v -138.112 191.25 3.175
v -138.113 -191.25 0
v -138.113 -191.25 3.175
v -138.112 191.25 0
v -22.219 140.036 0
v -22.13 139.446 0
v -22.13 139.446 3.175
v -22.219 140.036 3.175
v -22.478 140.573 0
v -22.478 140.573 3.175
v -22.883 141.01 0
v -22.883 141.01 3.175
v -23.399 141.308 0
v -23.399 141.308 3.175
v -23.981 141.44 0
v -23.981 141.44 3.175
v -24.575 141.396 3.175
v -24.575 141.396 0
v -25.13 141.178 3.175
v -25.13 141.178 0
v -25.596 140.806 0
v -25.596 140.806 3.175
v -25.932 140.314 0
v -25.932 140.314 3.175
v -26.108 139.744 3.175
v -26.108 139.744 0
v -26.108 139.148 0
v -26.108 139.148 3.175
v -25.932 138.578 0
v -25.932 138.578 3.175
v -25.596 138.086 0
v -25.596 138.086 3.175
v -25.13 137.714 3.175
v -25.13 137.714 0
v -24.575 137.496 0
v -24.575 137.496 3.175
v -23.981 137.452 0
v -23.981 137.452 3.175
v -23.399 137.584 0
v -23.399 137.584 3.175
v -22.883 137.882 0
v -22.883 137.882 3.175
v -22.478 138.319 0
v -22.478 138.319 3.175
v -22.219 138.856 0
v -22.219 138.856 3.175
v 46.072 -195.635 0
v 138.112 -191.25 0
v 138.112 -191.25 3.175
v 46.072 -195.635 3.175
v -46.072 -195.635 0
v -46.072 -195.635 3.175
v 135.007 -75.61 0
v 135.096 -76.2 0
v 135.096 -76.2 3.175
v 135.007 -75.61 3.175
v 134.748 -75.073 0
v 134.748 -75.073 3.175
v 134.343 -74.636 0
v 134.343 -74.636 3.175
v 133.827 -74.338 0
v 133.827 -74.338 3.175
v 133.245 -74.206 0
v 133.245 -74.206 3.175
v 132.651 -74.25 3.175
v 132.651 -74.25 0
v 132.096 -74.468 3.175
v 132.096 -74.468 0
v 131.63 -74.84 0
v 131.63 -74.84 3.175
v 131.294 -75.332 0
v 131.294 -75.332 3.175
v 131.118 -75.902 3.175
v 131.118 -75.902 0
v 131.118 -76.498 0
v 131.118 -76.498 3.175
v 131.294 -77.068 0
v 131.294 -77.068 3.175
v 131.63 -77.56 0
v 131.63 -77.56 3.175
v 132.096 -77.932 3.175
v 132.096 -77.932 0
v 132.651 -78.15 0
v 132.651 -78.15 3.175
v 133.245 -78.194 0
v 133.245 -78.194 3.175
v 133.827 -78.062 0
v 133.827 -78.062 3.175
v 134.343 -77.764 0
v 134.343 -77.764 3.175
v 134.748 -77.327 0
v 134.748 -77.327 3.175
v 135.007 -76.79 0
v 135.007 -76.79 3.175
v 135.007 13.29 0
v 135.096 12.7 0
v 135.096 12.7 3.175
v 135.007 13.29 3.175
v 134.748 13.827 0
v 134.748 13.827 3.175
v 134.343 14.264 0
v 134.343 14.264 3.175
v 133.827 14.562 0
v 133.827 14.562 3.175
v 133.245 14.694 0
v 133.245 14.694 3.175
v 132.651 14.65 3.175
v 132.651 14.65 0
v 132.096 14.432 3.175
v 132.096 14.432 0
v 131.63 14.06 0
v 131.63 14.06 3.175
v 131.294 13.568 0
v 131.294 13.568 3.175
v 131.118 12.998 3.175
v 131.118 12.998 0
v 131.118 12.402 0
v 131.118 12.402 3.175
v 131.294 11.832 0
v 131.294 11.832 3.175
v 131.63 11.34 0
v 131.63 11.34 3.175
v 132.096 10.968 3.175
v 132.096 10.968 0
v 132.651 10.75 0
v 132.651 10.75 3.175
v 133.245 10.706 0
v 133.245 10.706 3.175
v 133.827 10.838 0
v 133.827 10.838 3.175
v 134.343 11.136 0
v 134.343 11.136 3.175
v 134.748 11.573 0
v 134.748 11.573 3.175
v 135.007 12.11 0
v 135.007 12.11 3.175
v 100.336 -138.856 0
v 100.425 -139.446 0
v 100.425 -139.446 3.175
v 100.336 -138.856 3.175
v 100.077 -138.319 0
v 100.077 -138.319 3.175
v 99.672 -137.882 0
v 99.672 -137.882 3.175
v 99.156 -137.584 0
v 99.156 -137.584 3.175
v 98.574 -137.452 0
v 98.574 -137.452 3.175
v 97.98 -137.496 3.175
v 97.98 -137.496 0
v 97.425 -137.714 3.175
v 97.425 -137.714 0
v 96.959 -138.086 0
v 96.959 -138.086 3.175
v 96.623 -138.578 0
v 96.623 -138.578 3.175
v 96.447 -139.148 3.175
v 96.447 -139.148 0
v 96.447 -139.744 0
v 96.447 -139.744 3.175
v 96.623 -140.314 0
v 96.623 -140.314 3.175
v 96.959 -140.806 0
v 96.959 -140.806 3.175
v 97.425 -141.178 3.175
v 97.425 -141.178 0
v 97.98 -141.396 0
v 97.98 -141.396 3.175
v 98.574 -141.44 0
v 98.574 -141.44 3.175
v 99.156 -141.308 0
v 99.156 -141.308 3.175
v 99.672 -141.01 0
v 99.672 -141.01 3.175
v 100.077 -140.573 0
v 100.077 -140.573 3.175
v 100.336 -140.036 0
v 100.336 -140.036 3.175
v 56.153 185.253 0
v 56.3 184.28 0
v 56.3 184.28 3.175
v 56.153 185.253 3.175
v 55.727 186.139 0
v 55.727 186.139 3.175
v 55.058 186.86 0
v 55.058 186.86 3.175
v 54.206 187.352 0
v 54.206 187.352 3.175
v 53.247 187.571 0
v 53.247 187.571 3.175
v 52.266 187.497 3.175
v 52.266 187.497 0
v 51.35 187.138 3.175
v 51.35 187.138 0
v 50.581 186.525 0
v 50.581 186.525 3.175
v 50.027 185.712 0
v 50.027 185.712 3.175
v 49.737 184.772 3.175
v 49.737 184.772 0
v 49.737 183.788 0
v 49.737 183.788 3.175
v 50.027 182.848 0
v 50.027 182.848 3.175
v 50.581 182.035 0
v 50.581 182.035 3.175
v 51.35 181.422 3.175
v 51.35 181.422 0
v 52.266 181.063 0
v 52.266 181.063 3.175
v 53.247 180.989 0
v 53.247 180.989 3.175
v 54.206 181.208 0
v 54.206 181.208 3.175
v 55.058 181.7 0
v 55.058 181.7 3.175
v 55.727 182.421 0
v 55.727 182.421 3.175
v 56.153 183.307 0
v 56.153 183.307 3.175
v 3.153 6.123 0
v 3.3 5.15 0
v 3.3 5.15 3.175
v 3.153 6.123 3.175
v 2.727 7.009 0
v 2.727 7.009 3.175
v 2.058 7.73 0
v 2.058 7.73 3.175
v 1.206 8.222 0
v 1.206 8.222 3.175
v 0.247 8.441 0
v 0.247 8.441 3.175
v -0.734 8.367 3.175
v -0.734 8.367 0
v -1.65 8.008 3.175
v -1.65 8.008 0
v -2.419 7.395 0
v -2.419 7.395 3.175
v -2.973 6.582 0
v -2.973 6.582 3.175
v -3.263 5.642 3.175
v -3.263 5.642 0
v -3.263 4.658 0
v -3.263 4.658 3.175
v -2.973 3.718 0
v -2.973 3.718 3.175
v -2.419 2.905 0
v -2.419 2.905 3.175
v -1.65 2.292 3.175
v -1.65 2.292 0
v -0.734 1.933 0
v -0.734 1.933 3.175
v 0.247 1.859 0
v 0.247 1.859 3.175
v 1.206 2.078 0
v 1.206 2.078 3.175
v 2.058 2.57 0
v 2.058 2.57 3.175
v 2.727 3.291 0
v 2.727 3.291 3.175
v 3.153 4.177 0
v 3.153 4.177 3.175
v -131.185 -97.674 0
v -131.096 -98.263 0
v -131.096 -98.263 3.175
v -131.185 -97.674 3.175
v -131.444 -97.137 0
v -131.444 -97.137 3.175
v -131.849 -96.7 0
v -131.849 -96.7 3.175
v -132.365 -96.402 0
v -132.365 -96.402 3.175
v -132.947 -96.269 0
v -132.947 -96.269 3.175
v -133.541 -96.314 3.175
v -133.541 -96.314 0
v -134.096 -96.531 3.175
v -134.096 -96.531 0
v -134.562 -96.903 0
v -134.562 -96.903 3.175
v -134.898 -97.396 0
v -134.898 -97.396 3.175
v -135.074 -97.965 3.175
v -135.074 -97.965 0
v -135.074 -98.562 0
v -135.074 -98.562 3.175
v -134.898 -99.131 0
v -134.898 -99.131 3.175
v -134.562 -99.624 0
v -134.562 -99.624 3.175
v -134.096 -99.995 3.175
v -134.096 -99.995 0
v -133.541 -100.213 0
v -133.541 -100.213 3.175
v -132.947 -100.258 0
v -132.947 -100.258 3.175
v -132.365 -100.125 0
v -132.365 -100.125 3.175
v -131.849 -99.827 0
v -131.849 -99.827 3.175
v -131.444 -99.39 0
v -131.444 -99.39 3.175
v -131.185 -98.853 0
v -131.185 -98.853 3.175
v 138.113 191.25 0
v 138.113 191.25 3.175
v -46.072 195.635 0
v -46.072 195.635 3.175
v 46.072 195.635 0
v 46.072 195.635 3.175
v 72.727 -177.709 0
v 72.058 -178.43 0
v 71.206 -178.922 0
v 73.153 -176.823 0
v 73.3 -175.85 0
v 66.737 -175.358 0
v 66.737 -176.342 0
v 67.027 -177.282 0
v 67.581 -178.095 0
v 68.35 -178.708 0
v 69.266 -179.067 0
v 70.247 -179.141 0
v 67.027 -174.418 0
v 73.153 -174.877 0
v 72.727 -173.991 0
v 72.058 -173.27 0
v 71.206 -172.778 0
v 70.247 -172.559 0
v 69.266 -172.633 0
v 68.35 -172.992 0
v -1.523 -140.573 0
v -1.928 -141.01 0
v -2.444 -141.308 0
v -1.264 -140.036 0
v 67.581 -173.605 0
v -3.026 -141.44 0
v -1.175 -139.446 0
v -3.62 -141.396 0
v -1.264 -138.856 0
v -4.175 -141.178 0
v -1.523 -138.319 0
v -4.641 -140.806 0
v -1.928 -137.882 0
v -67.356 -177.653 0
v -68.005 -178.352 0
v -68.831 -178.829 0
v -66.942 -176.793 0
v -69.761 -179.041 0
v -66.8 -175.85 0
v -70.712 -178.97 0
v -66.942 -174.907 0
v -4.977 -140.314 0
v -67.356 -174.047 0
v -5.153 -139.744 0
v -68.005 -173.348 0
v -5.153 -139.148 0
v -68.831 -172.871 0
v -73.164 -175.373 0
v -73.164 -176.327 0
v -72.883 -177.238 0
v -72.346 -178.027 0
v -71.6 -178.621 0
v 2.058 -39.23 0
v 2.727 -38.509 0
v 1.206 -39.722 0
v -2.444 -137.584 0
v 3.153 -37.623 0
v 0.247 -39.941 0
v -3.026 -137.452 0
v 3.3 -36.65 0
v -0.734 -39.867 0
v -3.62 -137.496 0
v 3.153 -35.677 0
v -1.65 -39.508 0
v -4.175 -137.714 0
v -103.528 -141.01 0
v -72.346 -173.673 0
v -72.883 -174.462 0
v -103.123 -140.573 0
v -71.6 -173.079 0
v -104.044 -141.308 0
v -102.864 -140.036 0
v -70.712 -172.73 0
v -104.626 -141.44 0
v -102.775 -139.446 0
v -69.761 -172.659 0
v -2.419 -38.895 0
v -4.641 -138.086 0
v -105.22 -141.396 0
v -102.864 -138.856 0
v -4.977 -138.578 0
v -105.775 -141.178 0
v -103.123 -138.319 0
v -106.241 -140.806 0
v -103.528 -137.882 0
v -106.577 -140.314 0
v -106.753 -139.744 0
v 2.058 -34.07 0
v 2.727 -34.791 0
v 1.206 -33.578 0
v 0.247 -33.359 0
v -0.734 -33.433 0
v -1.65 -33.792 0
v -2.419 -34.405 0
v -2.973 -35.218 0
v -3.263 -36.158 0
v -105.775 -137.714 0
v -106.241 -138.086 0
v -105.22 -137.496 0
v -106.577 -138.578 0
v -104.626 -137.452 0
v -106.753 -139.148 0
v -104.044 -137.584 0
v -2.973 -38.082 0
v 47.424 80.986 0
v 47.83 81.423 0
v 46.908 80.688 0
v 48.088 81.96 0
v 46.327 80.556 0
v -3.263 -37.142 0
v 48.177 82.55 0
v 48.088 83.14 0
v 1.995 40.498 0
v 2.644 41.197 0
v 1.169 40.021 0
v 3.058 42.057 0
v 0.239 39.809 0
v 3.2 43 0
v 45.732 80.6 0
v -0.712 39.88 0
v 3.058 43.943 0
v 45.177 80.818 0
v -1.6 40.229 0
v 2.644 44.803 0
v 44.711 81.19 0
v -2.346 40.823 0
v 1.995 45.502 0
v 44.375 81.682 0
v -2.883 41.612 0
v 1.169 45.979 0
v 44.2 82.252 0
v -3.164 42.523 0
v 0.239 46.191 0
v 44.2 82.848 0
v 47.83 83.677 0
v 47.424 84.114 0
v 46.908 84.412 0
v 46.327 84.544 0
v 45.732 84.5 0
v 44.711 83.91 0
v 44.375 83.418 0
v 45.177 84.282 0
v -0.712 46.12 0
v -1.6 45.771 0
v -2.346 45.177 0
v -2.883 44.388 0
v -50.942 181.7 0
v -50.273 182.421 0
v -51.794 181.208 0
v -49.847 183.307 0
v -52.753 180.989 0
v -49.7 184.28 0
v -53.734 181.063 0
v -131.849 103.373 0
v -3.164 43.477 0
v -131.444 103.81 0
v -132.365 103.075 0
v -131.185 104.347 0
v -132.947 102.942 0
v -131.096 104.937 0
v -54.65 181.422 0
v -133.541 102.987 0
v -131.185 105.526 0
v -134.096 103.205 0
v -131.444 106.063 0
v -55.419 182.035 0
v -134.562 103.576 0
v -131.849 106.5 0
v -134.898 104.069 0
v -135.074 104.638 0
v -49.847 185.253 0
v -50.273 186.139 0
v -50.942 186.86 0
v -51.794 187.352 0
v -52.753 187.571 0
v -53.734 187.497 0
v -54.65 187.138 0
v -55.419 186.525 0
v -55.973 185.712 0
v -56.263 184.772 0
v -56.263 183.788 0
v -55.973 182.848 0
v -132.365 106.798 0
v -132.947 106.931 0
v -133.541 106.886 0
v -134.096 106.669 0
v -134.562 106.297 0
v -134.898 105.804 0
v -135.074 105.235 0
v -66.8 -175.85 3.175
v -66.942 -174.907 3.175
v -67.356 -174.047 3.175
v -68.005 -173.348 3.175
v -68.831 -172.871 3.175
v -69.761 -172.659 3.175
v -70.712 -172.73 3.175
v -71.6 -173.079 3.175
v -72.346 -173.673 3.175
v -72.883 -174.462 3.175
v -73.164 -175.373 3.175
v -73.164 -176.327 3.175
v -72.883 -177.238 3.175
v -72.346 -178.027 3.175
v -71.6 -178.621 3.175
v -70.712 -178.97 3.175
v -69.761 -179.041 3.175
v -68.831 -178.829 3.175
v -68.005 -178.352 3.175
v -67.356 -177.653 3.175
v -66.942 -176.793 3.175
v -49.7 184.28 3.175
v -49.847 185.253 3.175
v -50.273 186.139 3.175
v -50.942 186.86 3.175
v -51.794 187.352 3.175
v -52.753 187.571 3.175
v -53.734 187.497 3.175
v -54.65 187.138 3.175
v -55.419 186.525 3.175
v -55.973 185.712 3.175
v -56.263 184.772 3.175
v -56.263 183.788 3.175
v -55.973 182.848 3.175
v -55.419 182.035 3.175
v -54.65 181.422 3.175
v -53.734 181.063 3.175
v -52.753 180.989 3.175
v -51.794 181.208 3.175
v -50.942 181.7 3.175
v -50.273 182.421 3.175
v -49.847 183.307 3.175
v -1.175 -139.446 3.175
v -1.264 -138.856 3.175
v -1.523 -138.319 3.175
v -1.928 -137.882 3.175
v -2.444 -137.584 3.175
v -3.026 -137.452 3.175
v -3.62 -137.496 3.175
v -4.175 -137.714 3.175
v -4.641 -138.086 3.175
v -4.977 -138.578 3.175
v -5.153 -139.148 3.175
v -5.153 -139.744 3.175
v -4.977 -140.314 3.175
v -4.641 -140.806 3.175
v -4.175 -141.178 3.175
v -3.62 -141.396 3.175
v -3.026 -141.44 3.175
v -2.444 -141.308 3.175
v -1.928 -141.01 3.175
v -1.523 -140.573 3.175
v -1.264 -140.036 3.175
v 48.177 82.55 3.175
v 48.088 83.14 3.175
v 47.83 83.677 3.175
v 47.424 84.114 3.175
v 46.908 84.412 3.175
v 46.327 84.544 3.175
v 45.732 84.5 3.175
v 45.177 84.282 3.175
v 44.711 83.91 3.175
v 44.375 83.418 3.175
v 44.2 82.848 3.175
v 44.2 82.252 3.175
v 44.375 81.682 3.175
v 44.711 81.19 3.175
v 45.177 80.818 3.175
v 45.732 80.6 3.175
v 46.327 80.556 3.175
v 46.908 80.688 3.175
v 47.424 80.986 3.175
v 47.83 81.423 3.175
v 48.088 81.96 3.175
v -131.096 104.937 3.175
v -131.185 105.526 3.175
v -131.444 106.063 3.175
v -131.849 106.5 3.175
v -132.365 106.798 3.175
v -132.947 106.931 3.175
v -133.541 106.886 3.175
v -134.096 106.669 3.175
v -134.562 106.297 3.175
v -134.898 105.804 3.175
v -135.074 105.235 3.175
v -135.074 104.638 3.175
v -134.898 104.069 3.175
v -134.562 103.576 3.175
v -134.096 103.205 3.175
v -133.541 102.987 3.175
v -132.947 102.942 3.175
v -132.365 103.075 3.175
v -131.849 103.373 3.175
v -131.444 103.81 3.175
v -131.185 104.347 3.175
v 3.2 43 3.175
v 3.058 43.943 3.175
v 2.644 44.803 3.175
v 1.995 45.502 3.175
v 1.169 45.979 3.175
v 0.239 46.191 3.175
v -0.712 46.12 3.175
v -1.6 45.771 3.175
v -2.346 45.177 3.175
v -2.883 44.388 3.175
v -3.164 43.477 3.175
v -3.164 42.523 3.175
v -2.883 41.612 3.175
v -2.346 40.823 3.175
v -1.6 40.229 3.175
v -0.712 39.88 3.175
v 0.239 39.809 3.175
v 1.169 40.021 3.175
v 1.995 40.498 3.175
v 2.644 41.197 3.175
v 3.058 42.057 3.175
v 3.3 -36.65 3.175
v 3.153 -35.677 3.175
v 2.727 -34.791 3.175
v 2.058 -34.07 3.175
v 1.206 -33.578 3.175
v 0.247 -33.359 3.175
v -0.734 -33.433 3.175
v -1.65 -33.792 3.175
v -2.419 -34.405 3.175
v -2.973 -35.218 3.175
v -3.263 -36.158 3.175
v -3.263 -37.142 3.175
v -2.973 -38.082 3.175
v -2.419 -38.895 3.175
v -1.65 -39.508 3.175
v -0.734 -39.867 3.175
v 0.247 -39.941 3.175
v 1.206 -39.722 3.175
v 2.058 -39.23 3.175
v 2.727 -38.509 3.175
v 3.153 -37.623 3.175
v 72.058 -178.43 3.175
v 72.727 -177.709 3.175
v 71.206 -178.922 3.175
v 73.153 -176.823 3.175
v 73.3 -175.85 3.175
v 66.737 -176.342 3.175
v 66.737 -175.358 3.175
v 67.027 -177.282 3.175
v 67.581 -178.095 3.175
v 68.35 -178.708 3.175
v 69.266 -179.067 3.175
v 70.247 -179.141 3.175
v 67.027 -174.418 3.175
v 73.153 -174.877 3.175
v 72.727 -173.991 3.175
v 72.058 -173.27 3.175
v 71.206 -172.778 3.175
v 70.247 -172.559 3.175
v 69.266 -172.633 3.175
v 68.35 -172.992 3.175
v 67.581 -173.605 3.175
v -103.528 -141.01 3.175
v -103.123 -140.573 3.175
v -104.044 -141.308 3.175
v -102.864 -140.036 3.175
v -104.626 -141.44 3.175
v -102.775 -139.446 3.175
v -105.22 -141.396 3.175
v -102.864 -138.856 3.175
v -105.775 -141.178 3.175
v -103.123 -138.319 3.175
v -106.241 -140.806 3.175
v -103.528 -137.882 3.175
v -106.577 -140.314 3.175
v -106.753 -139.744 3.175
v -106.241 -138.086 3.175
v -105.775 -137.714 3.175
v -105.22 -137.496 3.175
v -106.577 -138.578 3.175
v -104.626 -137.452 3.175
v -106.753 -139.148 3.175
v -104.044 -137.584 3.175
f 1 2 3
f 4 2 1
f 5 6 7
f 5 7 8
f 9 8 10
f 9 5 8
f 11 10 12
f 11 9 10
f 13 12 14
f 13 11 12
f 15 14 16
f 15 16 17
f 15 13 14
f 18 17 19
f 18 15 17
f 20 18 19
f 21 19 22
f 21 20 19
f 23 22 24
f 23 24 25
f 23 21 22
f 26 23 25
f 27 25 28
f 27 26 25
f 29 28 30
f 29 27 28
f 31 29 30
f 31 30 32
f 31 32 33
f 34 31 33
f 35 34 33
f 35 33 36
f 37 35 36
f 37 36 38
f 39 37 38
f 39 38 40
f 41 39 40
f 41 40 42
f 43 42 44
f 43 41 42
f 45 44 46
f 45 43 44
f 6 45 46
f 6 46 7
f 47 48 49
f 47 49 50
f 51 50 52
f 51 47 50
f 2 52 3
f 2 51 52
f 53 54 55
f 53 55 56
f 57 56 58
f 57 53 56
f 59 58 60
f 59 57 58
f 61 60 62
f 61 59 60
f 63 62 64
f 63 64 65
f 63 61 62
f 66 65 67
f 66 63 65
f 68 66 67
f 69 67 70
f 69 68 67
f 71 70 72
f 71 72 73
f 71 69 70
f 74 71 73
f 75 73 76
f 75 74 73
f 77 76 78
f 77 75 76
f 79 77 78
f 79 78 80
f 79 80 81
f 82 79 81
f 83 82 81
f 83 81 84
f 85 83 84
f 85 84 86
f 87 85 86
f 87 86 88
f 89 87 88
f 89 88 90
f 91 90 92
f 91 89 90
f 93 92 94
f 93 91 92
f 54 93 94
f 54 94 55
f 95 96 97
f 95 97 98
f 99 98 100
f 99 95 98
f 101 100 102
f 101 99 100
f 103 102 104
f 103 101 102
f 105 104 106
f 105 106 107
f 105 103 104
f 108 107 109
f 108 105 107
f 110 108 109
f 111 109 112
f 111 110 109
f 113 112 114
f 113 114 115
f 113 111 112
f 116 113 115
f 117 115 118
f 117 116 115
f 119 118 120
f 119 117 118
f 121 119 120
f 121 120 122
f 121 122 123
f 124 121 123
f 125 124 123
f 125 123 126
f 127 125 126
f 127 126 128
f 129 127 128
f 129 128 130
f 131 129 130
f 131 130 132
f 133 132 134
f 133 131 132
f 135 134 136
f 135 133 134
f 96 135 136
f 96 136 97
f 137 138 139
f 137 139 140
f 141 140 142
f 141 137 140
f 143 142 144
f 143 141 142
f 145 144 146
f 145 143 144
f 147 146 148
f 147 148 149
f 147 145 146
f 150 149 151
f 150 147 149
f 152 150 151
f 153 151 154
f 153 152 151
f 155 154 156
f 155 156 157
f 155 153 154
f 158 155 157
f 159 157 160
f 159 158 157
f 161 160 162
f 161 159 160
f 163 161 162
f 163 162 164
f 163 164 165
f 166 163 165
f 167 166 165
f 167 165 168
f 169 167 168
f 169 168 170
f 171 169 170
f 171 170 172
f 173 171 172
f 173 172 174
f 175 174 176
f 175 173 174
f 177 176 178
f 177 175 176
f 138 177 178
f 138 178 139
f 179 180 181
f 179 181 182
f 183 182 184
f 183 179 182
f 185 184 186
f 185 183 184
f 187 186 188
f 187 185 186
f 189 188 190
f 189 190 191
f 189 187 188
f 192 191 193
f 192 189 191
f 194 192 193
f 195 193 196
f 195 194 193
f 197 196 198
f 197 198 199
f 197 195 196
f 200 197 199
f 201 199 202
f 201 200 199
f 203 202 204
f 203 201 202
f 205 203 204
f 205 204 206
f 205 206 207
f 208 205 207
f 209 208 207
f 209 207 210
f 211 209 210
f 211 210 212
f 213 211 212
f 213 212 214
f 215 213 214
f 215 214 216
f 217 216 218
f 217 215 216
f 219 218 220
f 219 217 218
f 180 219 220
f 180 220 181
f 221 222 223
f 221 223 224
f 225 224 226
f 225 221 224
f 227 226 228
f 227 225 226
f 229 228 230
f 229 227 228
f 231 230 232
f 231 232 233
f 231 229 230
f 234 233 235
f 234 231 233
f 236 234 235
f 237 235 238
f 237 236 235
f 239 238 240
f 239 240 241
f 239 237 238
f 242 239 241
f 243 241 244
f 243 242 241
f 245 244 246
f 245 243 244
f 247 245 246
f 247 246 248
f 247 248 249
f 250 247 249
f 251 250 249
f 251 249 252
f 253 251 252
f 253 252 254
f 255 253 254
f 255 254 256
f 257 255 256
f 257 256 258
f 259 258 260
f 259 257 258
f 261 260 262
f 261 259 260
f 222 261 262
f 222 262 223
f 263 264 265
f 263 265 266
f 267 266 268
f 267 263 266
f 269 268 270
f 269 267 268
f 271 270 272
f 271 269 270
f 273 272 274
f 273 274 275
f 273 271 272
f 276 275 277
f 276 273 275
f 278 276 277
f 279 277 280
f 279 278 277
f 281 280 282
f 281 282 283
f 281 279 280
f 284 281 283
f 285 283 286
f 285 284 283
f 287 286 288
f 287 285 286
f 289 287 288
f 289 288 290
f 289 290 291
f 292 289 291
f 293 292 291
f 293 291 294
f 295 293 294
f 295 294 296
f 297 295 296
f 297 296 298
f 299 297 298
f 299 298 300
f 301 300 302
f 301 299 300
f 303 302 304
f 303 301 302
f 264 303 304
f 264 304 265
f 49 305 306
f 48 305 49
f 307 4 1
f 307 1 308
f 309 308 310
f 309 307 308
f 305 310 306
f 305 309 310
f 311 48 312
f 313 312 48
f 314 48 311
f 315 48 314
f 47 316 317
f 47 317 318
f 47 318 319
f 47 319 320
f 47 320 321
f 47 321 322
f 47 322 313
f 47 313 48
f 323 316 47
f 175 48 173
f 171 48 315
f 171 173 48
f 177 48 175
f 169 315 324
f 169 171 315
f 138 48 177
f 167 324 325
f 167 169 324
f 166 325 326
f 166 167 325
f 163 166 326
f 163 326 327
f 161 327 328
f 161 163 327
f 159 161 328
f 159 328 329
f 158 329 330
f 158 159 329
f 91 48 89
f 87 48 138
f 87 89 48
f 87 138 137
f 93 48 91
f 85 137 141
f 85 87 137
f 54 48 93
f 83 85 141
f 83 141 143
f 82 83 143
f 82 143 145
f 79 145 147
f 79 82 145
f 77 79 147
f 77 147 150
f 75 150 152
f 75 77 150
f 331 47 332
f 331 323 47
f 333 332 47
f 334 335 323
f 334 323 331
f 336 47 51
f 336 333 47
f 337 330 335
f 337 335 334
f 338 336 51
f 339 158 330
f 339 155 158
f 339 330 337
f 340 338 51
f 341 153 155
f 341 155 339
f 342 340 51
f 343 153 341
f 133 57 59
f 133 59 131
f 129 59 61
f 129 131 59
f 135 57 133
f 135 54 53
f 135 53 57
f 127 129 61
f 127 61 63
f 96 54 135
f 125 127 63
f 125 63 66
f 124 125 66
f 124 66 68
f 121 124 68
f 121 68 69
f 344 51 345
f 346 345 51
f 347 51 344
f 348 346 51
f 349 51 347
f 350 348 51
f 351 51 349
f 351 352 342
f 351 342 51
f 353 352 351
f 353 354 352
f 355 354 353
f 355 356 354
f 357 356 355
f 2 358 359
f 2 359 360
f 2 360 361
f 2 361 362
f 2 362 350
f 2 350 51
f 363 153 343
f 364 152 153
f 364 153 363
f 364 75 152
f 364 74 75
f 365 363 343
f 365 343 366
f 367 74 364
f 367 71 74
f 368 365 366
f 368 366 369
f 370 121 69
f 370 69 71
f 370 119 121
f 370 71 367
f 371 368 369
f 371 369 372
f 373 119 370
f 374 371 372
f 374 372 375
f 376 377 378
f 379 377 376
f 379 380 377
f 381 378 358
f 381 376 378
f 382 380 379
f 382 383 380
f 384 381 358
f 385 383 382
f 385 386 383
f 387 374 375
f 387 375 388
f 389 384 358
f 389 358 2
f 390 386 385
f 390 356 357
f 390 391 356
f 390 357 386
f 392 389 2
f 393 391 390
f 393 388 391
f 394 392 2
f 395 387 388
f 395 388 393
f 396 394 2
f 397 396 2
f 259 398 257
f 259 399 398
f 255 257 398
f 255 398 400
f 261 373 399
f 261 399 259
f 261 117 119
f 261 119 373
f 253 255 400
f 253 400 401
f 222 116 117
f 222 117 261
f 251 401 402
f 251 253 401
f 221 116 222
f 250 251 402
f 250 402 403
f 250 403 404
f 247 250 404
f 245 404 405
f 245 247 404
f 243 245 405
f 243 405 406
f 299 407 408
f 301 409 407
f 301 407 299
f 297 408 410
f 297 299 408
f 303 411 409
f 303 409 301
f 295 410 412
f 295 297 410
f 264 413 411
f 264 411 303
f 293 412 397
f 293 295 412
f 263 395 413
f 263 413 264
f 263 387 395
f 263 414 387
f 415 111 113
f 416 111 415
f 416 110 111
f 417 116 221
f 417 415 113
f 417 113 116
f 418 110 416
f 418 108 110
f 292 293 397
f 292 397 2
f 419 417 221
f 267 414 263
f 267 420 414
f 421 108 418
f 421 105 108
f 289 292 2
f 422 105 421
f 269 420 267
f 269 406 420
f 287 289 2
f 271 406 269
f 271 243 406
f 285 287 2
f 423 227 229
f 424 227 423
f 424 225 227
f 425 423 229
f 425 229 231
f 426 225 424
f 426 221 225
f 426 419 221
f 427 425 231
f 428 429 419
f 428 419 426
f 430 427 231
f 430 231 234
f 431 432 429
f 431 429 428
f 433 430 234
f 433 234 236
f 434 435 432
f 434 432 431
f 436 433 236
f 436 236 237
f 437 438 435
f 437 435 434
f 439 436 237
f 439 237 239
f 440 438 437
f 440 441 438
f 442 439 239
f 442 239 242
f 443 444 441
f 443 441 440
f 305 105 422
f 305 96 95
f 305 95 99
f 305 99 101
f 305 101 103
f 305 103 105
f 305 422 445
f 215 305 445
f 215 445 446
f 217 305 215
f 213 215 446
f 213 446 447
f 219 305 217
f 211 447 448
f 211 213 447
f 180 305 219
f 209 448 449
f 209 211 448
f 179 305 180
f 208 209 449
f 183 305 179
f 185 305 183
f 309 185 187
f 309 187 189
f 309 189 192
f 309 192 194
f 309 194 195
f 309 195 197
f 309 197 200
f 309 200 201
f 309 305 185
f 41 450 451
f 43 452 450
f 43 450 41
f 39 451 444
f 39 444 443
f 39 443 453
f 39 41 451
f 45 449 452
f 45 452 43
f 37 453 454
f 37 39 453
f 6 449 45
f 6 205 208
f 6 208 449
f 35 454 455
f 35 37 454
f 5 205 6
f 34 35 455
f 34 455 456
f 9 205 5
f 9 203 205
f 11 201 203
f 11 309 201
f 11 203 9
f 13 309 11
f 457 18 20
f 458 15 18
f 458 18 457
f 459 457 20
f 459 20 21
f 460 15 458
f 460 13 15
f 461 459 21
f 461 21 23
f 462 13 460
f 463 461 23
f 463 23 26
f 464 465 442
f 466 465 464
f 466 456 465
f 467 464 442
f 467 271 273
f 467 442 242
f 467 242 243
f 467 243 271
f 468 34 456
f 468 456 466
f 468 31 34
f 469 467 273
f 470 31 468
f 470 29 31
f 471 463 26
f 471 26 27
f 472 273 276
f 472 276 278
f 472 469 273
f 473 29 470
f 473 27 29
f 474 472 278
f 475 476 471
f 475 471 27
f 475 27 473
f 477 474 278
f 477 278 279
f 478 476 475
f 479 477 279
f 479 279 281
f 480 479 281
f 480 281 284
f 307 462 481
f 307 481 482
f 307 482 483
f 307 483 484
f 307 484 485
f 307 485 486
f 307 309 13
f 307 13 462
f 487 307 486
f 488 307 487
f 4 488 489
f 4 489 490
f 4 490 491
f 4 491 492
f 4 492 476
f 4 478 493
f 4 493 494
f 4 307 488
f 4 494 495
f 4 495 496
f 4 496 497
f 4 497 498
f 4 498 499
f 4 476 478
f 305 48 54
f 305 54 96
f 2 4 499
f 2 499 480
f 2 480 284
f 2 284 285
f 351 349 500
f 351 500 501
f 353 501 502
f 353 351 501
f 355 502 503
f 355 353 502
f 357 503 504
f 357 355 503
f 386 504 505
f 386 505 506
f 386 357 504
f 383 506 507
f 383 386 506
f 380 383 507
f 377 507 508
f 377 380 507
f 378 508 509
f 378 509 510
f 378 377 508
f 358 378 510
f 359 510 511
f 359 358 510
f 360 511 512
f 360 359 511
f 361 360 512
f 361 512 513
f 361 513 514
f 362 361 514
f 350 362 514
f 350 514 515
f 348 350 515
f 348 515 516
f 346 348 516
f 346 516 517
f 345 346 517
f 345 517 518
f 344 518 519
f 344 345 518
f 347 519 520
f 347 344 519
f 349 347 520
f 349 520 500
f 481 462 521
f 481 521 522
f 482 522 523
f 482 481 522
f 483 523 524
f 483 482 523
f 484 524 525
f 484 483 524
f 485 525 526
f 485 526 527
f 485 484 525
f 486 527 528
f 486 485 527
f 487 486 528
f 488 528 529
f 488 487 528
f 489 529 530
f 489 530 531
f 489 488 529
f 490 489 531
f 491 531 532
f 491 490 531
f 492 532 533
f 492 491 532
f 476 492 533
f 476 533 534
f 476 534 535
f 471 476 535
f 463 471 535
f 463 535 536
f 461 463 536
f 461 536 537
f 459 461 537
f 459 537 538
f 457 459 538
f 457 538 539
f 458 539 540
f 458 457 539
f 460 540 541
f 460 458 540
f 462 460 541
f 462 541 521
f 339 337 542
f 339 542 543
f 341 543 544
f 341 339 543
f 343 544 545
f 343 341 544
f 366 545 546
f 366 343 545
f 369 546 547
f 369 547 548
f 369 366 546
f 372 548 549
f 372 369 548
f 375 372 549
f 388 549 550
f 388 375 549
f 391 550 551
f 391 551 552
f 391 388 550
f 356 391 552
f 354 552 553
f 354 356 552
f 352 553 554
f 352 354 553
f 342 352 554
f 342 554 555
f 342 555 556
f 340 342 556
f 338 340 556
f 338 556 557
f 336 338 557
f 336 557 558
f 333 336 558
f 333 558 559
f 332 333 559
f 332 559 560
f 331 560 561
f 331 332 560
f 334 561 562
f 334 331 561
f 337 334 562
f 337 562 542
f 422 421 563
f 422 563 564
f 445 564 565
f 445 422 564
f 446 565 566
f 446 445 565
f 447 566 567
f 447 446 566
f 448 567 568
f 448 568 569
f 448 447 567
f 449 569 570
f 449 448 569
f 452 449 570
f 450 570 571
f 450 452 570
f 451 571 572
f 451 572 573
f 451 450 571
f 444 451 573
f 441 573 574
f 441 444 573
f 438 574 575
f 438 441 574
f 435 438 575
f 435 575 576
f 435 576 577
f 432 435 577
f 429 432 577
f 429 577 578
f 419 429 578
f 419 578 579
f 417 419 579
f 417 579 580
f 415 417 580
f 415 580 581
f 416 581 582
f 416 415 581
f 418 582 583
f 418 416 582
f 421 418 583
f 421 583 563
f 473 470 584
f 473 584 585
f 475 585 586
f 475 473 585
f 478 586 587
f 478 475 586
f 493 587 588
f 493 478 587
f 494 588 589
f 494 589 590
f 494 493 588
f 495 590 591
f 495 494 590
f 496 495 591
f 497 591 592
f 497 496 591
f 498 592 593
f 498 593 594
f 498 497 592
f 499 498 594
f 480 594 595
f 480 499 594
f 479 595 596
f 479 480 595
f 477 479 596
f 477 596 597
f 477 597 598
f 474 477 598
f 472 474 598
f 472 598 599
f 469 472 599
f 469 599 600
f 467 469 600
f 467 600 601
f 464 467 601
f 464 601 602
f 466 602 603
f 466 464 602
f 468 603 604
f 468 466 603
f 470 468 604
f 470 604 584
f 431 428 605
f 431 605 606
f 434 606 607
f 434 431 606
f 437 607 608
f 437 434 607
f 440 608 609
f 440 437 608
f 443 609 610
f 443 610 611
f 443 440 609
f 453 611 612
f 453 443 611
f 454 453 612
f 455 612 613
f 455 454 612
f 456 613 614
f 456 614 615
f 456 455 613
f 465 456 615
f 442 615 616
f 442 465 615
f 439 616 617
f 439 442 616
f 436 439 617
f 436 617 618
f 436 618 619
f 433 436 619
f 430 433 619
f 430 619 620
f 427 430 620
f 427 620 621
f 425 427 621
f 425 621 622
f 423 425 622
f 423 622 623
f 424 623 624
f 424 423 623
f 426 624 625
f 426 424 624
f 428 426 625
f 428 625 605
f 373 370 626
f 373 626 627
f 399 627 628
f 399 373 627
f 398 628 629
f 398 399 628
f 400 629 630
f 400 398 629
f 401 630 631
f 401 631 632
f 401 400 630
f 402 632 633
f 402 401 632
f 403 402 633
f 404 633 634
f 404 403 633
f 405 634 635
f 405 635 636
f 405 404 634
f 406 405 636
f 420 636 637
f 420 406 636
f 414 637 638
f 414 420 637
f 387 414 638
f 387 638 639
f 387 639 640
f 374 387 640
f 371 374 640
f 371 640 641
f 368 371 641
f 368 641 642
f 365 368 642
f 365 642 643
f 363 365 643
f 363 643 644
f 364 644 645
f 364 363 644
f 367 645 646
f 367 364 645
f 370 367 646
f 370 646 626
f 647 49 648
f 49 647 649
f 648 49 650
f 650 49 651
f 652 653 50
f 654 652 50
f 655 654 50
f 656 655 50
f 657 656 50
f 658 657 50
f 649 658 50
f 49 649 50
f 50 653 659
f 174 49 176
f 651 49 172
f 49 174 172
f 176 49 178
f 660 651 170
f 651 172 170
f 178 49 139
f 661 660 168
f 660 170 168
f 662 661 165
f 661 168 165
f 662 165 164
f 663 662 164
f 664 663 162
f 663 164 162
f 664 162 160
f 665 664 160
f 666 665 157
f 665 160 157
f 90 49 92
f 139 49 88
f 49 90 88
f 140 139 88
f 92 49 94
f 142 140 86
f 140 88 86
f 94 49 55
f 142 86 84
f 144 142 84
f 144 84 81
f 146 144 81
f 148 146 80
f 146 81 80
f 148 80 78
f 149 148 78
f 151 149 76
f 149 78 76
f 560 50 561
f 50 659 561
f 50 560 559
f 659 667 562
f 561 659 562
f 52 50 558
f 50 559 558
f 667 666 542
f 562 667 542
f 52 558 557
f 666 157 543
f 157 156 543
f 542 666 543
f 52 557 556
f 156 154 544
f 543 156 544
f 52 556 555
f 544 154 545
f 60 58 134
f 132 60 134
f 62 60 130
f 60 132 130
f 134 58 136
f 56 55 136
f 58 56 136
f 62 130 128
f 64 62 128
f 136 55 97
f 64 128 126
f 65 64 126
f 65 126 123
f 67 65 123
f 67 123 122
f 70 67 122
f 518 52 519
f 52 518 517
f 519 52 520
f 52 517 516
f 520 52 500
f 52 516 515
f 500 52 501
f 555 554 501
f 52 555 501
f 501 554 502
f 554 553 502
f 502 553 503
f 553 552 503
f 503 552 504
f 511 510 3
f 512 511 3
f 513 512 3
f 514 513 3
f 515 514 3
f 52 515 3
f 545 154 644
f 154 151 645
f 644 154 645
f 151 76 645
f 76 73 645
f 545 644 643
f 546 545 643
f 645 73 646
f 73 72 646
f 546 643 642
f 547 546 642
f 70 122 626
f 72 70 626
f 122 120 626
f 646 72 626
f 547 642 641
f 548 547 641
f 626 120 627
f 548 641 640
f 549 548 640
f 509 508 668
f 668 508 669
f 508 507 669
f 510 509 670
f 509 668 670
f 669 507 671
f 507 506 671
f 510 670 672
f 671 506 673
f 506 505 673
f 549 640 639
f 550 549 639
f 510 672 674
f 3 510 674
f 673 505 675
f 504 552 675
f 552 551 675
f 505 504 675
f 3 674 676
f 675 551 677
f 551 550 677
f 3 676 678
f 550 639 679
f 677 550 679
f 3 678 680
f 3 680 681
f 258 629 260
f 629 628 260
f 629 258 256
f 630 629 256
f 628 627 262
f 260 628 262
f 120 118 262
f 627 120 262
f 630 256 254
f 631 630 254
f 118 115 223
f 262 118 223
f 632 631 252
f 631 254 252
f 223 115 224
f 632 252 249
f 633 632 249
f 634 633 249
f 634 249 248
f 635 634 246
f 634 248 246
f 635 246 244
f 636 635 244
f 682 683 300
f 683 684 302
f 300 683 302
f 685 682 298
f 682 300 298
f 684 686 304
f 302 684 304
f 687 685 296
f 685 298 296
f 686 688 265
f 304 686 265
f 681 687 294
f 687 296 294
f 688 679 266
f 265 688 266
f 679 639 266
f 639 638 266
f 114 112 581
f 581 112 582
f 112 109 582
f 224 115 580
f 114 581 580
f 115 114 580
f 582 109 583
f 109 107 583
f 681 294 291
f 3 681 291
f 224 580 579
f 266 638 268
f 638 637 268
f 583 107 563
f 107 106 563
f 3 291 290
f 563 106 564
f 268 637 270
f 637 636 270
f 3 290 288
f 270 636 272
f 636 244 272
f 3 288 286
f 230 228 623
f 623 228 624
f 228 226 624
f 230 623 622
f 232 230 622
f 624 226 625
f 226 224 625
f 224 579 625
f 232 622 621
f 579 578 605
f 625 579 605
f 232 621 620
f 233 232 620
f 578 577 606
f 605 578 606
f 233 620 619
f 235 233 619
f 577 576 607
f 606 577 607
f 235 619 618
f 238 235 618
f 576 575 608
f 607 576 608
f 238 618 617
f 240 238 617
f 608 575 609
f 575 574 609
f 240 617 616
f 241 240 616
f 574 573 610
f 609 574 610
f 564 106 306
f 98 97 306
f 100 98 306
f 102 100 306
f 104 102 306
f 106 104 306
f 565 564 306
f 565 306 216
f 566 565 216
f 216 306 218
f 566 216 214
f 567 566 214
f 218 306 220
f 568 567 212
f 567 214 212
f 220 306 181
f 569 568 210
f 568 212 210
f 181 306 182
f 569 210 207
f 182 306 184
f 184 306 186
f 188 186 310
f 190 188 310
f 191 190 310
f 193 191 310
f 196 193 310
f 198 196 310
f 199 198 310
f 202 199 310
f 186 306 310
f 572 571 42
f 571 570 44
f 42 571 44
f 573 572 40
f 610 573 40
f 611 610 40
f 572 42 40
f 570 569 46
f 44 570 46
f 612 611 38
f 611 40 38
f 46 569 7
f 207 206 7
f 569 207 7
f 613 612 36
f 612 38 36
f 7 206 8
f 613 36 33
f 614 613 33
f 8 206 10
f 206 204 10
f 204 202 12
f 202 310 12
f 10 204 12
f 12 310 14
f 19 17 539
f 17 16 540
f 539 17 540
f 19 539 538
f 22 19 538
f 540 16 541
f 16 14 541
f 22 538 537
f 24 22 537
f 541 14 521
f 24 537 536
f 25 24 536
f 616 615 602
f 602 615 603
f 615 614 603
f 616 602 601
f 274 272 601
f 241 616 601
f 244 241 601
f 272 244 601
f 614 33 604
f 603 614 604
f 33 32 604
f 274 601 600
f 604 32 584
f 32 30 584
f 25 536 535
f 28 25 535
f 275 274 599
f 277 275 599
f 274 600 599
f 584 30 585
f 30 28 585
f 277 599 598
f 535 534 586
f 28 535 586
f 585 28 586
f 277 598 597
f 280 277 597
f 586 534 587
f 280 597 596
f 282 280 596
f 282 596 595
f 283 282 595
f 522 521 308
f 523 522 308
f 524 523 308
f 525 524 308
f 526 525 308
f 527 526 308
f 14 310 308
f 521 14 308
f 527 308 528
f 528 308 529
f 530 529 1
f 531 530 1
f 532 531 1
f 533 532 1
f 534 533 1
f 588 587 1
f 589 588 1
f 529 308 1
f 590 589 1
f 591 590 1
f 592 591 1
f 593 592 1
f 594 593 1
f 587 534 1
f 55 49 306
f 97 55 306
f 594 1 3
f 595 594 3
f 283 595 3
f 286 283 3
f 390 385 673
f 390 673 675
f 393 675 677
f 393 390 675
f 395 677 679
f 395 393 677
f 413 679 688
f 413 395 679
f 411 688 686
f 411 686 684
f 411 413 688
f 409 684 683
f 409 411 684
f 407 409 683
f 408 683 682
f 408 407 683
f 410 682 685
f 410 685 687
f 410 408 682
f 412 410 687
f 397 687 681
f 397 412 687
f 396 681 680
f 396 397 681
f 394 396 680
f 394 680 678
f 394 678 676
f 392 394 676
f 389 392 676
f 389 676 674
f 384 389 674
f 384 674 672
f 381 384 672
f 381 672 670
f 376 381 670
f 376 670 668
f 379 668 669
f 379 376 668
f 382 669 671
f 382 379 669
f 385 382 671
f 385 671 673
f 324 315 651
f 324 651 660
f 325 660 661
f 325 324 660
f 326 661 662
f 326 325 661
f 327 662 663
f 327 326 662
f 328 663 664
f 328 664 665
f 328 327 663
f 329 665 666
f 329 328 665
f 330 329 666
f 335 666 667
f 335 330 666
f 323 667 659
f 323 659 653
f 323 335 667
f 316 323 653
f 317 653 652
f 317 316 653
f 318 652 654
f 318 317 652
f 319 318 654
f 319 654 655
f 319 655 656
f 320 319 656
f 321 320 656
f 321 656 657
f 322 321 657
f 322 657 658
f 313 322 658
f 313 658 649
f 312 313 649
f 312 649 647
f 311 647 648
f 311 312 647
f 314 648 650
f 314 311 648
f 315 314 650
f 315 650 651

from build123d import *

# Parameters (mm, degrees)
SKETCH1_R      = 2
SKETCH1_R_2    = 3.3
SKETCH1_R_3    = 3.2
EXTRUDE1_DEPTH = 3.175


with BuildPart() as part:
    # Sketch1 → Extrude1 (new body)
    with BuildSketch(Plane.XY):
        with BuildLine():
            Line((138.1125, 191.25), (138.1125, -191.25))
            ThreePointArc((138.1125, -191.25), (0, -196.183512306), (-138.1125, -191.25))
            Line((-138.1125, -191.25), (-138.1125, 191.25))
            ThreePointArc((-138.1125, 191.25), (0, 196.183512306), (138.1125, 191.25))
        make_face()
        with Locations((46.1772, 82.55)):
            Circle(SKETCH1_R, mode=Mode.SUBTRACT)
        with Locations((53, 184.28)):
            Circle(SKETCH1_R_2, mode=Mode.SUBTRACT)
        with Locations((-24.13, 139.446)):
            Circle(SKETCH1_R, mode=Mode.SUBTRACT)
        with Locations((-133.096, 104.936568767)):
            Circle(SKETCH1_R, mode=Mode.SUBTRACT)
        with Locations((-53, 184.28)):
            Circle(SKETCH1_R_2, mode=Mode.SUBTRACT)
        with Locations((0, 43)):
            Circle(SKETCH1_R_3, mode=Mode.SUBTRACT)
        with Locations((0, 5.15)):
            Circle(SKETCH1_R_2, mode=Mode.SUBTRACT)
        with Locations((0, -36.65)):
            Circle(SKETCH1_R_2, mode=Mode.SUBTRACT)
        with Locations((133.096, 12.7)):
            Circle(SKETCH1_R, mode=Mode.SUBTRACT)
        with Locations((133.096, -76.2)):
            Circle(SKETCH1_R, mode=Mode.SUBTRACT)
        with Locations((98.425, -139.446)):
            Circle(SKETCH1_R, mode=Mode.SUBTRACT)
        with Locations((70, -175.85)):
            Circle(SKETCH1_R_2, mode=Mode.SUBTRACT)
        with Locations((-3.175, -139.446)):
            Circle(SKETCH1_R, mode=Mode.SUBTRACT)
        with Locations((-133.096, -98.263431233)):
            Circle(SKETCH1_R, mode=Mode.SUBTRACT)
        with Locations((-104.775, -139.446)):
            Circle(SKETCH1_R, mode=Mode.SUBTRACT)
        with Locations((-70, -175.85)):
            Circle(SKETCH1_R_3, mode=Mode.SUBTRACT)
    extrude(amount=EXTRUDE1_DEPTH)


solid = part.part
